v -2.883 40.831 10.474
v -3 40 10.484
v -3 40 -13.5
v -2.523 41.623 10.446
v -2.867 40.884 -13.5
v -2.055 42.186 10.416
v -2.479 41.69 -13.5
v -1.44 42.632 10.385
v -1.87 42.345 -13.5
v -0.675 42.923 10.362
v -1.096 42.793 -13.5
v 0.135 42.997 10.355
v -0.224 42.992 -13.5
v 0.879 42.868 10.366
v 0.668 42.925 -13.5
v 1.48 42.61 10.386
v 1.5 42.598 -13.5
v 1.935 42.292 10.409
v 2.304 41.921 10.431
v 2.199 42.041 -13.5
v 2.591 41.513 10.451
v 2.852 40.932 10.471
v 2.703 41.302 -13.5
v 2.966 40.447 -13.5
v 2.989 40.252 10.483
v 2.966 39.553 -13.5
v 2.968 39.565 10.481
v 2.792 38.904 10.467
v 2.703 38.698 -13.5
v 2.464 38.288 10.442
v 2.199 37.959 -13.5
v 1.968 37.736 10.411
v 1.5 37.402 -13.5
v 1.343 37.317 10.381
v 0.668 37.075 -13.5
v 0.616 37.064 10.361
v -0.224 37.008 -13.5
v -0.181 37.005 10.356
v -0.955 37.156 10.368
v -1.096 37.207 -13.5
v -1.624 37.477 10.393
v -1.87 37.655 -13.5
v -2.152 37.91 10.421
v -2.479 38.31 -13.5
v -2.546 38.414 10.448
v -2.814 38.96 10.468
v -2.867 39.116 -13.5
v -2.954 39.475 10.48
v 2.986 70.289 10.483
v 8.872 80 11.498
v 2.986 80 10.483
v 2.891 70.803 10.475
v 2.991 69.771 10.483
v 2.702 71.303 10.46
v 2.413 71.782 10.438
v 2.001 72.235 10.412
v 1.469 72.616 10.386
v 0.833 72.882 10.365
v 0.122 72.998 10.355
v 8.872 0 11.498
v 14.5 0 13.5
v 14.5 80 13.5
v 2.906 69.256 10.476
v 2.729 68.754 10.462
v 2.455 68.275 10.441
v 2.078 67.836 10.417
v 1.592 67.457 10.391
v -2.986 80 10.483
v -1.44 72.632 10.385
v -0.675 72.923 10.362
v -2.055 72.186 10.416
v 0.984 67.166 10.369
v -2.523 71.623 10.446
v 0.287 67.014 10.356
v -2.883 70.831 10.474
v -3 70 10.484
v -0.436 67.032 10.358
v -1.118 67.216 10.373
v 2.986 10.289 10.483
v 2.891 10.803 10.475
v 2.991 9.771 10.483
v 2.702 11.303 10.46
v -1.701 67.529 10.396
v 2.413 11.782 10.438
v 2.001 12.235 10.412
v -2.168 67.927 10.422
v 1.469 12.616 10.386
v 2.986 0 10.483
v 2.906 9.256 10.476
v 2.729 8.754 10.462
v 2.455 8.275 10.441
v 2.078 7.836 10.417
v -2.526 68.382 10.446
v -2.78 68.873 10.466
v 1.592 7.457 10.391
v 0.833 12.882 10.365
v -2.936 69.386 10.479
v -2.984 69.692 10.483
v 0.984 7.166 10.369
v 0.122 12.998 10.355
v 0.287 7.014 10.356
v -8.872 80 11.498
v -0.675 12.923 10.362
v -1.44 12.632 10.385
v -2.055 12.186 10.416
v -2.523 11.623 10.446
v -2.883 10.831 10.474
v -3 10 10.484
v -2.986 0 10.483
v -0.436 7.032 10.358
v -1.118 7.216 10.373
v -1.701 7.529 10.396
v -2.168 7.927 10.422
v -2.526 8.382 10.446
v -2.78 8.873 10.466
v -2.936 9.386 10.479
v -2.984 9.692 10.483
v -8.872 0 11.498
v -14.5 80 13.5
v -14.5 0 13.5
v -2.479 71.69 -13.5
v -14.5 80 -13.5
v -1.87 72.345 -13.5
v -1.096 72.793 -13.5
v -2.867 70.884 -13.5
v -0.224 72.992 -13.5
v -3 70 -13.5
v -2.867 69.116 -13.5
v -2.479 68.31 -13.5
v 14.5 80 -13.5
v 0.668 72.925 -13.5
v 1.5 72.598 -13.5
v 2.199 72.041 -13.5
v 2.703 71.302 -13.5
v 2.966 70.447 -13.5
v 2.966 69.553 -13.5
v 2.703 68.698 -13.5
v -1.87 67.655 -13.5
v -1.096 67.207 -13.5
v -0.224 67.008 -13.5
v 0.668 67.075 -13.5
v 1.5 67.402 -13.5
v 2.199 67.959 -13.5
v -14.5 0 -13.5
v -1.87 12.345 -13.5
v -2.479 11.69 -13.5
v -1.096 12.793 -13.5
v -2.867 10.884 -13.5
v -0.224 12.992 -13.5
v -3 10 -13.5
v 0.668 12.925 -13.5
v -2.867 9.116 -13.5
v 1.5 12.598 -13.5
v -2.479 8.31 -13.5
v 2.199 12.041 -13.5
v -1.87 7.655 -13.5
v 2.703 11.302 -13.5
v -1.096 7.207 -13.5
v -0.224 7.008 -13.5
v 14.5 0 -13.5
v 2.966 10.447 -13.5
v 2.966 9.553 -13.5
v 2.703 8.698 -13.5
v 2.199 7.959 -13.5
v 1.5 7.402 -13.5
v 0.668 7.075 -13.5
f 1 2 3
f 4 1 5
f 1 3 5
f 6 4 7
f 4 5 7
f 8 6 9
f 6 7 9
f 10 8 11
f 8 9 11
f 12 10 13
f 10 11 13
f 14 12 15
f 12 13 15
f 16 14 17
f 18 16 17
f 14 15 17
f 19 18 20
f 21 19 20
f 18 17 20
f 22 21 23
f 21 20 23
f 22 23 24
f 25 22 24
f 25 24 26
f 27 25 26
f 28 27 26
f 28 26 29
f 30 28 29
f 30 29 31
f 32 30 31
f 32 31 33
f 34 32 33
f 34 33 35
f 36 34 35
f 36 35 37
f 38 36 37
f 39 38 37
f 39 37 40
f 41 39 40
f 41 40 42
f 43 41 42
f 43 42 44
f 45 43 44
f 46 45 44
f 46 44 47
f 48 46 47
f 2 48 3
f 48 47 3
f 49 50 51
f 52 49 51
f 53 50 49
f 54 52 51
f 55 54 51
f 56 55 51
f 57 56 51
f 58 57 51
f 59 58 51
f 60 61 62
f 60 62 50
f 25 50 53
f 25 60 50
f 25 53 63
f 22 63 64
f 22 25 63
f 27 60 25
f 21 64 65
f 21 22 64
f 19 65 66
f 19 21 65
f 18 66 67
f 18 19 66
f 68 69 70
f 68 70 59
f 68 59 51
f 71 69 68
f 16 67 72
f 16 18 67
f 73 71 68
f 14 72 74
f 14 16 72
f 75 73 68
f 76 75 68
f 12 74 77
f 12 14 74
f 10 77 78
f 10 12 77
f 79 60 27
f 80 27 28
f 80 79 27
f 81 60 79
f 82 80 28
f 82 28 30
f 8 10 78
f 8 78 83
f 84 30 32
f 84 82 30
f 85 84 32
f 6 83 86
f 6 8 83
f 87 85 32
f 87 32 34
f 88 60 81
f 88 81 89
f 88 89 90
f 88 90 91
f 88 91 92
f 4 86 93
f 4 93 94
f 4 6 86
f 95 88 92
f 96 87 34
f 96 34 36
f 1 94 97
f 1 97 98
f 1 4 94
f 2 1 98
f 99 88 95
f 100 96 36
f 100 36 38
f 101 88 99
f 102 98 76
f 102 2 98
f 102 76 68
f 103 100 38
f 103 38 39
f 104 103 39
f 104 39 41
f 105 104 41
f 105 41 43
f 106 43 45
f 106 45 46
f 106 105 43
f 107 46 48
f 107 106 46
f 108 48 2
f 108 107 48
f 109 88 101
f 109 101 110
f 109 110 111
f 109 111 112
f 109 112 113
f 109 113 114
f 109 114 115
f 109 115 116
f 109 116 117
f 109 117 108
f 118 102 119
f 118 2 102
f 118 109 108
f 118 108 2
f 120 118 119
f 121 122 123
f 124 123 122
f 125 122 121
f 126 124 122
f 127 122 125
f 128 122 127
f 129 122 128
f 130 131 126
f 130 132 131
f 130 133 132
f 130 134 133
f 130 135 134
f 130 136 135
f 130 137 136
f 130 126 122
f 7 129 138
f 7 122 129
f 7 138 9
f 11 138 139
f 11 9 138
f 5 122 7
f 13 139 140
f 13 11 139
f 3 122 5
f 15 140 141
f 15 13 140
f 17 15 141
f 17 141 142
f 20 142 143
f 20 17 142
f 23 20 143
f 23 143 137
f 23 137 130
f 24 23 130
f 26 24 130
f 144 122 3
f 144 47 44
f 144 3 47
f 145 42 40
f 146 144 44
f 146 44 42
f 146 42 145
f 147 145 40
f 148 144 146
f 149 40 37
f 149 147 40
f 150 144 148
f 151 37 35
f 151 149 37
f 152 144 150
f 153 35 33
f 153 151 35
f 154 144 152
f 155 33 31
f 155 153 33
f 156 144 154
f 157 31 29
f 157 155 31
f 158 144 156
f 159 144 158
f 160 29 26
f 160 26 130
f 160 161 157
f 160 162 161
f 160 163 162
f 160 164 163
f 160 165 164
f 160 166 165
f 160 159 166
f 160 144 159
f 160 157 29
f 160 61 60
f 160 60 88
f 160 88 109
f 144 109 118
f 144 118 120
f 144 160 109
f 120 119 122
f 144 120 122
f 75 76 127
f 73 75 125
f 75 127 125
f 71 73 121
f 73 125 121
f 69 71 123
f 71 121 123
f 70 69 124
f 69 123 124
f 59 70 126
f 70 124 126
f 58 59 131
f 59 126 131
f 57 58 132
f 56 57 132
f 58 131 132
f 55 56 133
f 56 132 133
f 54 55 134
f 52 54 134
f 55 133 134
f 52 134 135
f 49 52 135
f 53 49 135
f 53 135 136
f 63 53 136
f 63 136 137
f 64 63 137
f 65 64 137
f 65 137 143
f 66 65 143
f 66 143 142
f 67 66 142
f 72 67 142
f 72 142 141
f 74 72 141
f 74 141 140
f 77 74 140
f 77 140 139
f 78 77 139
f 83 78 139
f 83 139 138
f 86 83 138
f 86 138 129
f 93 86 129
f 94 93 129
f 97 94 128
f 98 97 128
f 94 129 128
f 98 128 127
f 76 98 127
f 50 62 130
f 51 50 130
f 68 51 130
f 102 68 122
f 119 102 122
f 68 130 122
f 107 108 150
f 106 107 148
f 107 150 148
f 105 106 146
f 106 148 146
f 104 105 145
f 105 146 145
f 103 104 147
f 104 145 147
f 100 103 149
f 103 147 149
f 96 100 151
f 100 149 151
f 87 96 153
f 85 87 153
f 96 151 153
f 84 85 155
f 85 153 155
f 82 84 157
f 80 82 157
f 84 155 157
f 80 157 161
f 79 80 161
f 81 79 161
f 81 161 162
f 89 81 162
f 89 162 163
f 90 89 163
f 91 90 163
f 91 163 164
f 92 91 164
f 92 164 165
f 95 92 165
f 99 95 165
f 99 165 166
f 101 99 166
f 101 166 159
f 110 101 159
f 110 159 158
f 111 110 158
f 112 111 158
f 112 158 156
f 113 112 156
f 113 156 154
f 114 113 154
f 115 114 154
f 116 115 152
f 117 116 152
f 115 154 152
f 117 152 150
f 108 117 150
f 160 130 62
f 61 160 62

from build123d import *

# Parameters (mm, degrees)
BOSS_EXTRUDE1_DEPTH = 80
SKETCH2_R           = 3
CUT_EXTRUDE1_DEPTH  = 28


with BuildPart() as part:
    # Sketch1 → Boss-Extrude1 (new body)
    with BuildSketch(Plane(origin=(0, 0, 0), x_dir=(1, 0, 0), z_dir=(0, 1, 0))):
        with BuildLine():
            Line((-14.5, 13.5), (14.5, 13.5))
            Line((14.5, 13.5), (14.5, -13.5))
            ThreePointArc((14.5, -13.5), (0, -10.355140872), (-14.5, -13.5))
            Line((-14.5, -13.5), (-14.5, 13.5))
        make_face()
    extrude(amount=BOSS_EXTRUDE1_DEPTH)

    # Sketch2 → Cut-Extrude1 (cut, through all)
    with BuildSketch(Plane(origin=(0, 0, -13.5), x_dir=(-1, 0, 0), z_dir=(0, 0, -1))):
        with Locations((0, 70)):
            Circle(SKETCH2_R)
        with Locations((0, 40)):
            Circle(SKETCH2_R)
        with Locations((0, 10)):
            Circle(SKETCH2_R)
    extrude(amount=-CUT_EXTRUDE1_DEPTH, mode=Mode.SUBTRACT)


solid = part.part
